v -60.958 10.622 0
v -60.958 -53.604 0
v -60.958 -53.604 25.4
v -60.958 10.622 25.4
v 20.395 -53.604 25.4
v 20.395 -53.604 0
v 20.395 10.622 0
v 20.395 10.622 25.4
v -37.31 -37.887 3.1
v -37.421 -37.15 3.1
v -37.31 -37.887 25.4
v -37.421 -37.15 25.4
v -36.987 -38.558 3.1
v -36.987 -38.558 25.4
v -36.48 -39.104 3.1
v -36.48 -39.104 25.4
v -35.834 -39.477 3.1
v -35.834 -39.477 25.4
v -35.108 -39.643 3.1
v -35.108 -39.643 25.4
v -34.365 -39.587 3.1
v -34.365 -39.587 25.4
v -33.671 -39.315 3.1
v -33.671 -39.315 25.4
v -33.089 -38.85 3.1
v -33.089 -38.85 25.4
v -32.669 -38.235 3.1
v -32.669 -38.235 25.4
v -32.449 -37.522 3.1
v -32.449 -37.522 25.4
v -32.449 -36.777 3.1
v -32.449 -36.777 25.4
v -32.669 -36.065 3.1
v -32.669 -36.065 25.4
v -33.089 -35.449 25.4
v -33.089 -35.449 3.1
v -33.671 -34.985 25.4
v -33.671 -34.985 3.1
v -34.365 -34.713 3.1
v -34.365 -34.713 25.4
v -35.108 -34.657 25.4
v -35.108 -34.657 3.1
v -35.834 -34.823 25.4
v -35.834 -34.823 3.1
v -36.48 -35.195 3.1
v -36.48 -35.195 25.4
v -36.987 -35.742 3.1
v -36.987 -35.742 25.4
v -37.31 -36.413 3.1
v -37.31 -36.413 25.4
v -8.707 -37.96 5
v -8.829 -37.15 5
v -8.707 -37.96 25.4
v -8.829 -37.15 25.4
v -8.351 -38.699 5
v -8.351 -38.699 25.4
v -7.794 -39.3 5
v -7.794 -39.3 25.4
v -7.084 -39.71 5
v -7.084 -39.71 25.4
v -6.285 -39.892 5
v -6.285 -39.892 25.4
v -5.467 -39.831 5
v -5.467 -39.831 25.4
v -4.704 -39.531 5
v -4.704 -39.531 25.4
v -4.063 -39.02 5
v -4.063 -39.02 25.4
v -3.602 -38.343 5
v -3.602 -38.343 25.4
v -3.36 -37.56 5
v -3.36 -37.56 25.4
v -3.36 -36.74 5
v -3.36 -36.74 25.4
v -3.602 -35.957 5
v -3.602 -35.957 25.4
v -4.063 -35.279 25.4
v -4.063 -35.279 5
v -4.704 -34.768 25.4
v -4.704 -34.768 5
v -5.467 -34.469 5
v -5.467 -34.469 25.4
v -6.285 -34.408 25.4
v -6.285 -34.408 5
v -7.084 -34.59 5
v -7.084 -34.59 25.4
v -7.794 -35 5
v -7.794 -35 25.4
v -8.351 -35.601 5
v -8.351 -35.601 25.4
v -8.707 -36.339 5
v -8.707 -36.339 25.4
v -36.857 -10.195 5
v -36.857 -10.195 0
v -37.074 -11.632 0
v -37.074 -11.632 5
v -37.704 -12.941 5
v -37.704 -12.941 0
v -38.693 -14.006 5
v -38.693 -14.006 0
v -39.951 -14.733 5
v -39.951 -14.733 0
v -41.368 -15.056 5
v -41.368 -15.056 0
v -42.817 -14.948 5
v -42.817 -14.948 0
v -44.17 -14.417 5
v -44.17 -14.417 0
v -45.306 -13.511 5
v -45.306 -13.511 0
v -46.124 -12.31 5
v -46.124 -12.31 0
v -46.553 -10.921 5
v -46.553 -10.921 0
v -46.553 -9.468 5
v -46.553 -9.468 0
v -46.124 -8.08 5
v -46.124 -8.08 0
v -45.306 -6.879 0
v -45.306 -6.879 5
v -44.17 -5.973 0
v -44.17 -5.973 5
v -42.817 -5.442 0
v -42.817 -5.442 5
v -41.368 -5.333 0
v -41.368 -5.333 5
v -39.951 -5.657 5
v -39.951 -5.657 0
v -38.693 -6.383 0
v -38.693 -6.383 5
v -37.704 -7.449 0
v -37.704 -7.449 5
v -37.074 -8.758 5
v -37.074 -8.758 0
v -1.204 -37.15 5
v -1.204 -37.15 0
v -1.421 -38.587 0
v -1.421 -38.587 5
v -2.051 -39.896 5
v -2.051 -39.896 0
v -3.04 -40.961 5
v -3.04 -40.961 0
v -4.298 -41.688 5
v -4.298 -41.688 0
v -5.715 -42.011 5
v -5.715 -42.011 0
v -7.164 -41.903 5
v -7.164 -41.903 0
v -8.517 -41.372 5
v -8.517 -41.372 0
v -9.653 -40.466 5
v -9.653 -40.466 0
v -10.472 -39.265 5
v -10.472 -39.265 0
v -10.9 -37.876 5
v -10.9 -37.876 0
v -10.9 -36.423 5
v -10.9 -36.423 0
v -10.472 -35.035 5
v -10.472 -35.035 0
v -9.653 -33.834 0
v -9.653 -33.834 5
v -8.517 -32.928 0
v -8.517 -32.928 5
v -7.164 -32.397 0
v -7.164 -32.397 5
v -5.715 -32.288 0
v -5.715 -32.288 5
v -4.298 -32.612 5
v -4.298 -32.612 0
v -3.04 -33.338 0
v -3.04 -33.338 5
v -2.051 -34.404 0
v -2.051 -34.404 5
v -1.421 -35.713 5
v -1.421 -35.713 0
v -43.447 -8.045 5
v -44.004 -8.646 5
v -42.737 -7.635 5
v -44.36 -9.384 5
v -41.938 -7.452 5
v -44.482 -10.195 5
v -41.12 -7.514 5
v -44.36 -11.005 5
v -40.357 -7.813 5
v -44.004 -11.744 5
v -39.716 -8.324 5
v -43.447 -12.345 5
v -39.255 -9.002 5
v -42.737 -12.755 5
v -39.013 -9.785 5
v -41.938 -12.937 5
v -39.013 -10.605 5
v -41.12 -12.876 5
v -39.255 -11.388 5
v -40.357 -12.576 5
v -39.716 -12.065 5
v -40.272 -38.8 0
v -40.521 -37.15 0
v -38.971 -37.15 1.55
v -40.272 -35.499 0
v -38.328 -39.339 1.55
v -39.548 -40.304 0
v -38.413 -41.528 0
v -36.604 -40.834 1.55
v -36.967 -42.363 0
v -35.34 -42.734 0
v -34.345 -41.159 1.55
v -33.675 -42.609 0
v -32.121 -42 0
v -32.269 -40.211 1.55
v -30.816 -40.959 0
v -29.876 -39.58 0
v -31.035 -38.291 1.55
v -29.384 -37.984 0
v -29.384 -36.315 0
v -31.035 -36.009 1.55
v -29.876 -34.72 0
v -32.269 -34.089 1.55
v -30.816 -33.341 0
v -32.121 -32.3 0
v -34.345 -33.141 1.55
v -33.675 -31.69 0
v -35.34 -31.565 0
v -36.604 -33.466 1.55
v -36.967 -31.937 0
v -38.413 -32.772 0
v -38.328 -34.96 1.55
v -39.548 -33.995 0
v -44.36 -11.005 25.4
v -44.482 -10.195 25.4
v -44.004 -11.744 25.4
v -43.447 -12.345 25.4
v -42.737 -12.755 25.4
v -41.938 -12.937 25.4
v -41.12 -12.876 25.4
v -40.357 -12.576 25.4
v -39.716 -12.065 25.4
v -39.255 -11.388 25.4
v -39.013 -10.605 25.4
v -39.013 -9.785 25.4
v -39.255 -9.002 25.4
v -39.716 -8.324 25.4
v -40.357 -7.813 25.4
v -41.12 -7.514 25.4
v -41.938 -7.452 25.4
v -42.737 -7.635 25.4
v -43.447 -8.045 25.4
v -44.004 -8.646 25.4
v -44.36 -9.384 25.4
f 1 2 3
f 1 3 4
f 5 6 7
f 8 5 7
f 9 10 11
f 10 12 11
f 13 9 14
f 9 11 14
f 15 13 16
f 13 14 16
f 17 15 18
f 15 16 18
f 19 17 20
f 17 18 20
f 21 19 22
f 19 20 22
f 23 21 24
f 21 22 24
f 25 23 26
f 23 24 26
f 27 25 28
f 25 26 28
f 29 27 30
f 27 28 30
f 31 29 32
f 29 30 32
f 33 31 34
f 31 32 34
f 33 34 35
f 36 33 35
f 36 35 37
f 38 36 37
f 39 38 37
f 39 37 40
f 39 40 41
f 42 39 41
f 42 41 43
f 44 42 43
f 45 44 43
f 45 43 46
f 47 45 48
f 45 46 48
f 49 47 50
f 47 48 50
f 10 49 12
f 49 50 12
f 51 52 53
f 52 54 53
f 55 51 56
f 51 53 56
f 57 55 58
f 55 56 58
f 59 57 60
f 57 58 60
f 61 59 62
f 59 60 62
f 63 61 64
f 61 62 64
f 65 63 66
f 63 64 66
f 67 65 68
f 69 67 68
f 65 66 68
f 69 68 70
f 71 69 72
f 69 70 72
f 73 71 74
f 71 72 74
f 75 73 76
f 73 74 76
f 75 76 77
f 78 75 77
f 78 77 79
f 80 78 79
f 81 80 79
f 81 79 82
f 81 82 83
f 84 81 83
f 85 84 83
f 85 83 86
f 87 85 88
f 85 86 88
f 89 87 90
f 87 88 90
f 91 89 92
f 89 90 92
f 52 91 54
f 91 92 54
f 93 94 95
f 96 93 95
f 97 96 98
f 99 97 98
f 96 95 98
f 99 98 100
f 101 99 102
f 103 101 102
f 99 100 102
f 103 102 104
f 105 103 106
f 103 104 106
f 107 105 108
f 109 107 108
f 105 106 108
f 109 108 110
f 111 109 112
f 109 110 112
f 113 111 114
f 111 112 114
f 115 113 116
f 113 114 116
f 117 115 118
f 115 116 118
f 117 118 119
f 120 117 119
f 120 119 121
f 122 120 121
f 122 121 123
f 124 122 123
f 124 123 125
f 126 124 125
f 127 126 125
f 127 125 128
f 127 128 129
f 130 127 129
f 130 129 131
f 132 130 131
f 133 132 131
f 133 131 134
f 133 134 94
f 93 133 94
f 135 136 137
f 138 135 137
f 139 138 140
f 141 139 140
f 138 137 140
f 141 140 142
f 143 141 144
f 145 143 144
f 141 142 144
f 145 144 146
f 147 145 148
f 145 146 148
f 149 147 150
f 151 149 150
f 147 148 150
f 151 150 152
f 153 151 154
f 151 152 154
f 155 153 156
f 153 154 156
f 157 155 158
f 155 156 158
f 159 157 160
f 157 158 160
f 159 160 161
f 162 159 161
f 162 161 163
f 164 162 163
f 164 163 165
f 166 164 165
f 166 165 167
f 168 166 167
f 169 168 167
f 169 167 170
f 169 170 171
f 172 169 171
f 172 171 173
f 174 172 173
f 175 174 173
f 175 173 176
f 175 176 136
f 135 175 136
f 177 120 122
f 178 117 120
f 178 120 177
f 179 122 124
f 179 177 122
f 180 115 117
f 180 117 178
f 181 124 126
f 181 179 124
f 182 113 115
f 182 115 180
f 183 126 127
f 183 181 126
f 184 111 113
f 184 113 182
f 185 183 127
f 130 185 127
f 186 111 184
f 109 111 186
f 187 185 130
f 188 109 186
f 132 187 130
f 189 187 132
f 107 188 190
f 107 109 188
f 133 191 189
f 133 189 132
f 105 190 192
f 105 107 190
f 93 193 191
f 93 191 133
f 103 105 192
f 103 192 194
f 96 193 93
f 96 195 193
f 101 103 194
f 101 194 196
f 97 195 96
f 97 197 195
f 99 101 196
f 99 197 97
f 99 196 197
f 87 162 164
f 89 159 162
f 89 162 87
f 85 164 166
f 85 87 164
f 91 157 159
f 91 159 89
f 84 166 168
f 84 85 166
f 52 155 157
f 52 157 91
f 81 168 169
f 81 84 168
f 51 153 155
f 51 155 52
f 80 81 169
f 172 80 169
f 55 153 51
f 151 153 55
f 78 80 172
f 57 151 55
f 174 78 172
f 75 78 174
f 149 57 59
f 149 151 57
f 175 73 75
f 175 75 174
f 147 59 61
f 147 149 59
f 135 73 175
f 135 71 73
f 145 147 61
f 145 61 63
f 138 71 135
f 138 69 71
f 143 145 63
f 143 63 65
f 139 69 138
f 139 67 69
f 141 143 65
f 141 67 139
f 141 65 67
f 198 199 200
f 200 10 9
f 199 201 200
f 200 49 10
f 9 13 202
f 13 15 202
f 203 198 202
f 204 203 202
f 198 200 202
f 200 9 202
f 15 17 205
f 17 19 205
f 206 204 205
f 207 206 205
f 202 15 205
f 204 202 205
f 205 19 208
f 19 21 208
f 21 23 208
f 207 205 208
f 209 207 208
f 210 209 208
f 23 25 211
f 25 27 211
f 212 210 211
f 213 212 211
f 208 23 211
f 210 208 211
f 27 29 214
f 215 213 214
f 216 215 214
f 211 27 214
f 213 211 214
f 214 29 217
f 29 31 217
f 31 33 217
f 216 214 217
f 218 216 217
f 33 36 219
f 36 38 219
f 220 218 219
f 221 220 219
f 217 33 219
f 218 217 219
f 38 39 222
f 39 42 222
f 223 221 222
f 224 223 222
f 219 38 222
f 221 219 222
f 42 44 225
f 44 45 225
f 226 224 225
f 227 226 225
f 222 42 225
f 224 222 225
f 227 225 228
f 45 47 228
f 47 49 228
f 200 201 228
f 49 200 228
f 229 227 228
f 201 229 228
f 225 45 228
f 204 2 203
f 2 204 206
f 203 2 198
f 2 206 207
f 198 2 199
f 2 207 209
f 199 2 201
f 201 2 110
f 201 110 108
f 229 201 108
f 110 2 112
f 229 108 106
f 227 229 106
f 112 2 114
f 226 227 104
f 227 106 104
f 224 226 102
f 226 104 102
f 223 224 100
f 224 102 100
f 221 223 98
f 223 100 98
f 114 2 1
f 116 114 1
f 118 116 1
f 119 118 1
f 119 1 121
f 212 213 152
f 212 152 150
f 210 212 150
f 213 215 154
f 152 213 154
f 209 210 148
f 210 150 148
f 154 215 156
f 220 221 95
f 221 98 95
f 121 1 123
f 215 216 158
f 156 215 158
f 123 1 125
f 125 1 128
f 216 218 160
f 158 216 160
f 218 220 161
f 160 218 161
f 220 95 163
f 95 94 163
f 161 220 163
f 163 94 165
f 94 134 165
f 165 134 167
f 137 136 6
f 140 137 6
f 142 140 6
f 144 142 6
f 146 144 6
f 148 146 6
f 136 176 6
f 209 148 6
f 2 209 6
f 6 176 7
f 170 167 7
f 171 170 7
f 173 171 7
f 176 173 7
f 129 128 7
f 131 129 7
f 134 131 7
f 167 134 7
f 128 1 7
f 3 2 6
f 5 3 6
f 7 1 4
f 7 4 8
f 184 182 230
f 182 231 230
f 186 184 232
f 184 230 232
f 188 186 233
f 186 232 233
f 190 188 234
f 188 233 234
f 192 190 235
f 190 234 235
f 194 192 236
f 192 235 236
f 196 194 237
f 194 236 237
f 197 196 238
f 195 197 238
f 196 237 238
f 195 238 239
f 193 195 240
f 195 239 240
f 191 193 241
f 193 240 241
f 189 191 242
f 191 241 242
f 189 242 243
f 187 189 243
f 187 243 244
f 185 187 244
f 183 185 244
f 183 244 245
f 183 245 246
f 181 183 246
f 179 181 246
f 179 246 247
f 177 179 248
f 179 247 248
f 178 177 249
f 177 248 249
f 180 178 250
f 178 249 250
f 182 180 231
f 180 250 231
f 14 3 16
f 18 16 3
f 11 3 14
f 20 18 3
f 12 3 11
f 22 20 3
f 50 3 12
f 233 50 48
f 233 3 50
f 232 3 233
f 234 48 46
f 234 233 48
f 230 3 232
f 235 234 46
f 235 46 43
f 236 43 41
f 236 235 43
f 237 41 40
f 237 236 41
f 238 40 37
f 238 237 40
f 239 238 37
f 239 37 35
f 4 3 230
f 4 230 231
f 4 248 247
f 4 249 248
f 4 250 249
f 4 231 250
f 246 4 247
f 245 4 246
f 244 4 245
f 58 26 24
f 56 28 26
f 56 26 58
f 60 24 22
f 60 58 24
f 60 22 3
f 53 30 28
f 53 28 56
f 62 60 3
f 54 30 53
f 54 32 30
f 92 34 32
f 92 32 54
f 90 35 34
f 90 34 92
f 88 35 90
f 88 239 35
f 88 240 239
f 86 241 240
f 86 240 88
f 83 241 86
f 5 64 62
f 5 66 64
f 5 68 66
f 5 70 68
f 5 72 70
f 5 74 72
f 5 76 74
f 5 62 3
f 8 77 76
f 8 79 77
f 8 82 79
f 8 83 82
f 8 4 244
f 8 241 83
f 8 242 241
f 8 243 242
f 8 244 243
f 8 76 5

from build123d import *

# Parameters (mm, degrees)
F0_W           = 81.3528001308
F0_H           = 64.2257872969
F1_DEPTH       = 25.4
F2_D           = 5
F2_CSINK_D     = 11.2
F2_CSINK_ANGLE = 90
F3_D           = 5.5
F3_CBORE_D     = 9.75
F3_CBORE_DEPTH = 5
F4_D           = 5.5
F4_CBORE_D     = 9.75
F4_CBORE_DEPTH = 5


with BuildPart() as f1:
    # F0 (on Top) → F1 (new body)
    with BuildSketch(Plane.XY):
        with Locations((-20.2816128731, -21.4906251058)):
            Rectangle(F0_W, F0_H)
    extrude(amount=F1_DEPTH)

    # F2 (through all)
    with Locations(Plane(origin=(0, 0, 0), x_dir=(1, 0, 0), z_dir=(0, 0, -1))):
        with Locations((-34.9211469293, 37.1498316526)):
            CounterSinkHole(F2_D / 2, F2_CSINK_D / 2, counter_sink_angle=F2_CSINK_ANGLE)

    # F3 (through all)
    with Locations(Plane(origin=(0, 0, 0), x_dir=(1, 0, 0), z_dir=(0, 0, -1))):
        with Locations((-41.7322255671, 10.194754228)):
            CounterBoreHole(F3_D / 2, F3_CBORE_D / 2, F3_CBORE_DEPTH)

    # F4 (through all)
    with Locations(Plane(origin=(0, 0, 0), x_dir=(1, 0, 0), z_dir=(0, 0, -1))):
        with Locations((-6.0793207958, 37.1498316526)):
            CounterBoreHole(F4_D / 2, F4_CBORE_D / 2, F4_CBORE_DEPTH)


solid = f1.part
